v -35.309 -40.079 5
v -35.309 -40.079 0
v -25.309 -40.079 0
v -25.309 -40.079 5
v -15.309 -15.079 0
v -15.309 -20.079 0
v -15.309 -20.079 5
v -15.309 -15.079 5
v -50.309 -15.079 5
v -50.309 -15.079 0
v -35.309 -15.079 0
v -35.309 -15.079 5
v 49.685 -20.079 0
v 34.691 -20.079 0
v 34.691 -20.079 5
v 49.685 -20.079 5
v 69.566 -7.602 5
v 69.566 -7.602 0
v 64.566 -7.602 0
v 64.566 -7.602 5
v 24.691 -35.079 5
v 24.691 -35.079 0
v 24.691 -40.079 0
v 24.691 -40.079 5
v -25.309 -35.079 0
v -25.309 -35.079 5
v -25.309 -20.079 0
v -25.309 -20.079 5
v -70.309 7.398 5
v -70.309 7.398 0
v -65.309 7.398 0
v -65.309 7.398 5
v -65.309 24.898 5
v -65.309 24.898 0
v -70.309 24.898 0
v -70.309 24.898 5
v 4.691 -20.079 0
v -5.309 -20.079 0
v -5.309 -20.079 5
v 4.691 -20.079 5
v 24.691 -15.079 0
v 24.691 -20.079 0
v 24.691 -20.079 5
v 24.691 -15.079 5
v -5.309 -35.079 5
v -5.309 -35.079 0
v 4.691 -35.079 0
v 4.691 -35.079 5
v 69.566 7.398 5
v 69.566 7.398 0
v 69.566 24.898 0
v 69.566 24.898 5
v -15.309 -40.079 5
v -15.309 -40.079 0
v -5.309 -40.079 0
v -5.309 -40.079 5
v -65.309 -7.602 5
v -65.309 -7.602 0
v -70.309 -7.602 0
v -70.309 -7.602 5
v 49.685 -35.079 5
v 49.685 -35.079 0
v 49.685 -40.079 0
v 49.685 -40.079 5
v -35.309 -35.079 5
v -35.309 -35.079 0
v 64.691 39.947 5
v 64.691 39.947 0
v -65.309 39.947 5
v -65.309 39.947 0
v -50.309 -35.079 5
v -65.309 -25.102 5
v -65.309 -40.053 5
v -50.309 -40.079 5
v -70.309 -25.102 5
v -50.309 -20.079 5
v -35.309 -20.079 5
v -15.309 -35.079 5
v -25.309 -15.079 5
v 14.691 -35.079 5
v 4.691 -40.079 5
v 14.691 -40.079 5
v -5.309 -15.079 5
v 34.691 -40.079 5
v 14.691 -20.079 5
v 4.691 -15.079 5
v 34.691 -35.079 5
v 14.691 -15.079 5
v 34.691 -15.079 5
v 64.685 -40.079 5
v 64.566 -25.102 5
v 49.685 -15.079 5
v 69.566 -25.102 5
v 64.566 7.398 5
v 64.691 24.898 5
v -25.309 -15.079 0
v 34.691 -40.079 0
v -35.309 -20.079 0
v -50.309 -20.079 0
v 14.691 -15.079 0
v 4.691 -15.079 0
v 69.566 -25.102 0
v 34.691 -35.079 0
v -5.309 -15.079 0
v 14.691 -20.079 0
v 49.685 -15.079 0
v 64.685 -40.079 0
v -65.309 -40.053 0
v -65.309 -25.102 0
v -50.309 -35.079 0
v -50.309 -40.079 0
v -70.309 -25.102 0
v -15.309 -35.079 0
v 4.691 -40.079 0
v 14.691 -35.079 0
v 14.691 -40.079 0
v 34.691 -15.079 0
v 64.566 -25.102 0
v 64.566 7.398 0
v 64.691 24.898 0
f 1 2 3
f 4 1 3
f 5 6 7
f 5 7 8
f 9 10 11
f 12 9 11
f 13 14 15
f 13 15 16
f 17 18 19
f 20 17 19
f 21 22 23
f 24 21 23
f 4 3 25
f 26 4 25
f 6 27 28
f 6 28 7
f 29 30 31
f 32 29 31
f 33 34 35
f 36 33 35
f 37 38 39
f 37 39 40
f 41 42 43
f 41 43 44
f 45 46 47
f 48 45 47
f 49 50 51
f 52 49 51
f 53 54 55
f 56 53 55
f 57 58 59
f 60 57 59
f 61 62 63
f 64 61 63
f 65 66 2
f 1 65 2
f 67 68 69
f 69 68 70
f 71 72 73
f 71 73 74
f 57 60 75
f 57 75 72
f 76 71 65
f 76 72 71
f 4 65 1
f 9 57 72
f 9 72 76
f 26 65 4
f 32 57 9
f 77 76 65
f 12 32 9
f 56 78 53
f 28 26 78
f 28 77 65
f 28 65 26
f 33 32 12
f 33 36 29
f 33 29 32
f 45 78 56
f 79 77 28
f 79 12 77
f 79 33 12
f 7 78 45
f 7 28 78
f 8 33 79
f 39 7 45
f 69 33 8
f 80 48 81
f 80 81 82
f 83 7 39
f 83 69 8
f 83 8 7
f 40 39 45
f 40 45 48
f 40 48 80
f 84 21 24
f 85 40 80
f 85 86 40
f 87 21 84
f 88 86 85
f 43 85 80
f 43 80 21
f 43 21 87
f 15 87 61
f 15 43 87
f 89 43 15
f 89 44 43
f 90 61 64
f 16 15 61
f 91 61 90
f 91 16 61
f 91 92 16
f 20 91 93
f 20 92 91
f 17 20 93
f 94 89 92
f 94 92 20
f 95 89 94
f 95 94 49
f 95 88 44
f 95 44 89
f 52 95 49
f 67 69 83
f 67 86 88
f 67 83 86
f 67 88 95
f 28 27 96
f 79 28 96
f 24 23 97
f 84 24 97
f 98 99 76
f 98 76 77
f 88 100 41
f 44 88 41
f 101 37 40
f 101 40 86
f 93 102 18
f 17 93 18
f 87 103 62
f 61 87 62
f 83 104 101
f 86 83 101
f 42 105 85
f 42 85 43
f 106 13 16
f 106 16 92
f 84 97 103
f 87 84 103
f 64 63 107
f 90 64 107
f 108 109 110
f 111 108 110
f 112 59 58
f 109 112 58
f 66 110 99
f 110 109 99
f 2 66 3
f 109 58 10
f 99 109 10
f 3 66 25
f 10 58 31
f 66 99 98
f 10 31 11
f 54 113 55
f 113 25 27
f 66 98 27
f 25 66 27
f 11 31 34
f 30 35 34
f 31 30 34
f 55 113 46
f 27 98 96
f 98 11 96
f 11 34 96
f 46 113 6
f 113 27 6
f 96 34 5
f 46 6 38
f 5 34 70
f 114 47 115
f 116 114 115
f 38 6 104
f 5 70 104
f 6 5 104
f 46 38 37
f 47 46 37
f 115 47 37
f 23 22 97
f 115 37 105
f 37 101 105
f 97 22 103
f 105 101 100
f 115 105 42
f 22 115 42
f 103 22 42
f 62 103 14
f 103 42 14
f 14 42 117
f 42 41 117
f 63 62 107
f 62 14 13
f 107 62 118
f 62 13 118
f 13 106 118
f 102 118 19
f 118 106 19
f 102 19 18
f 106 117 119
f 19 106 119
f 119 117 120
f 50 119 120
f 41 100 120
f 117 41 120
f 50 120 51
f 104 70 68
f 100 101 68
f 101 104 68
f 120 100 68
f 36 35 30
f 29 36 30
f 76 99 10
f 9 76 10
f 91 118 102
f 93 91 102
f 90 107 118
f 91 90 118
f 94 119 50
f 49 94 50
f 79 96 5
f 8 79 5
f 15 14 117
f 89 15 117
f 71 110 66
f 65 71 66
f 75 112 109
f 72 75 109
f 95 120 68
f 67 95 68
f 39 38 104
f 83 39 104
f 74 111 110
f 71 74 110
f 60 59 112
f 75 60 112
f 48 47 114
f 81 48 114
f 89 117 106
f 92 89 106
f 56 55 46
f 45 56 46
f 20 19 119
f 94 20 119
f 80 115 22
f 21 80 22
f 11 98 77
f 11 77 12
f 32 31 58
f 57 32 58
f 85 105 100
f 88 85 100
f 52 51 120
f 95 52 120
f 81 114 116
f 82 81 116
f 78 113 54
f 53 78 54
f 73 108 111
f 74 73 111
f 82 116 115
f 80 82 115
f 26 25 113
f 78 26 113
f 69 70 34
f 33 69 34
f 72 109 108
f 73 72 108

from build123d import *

# Parameters (mm, degrees)
SKETCH1_W           = 10
SKETCH1_H           = 5
SKETCH1_W_2         = 15
SKETCH1_W_3         = 14.993943351
BOSS_EXTRUDE2_DEPTH = 5


with BuildPart() as part:
    # Sketch1 → Boss-Extrude2 (new body)
    with BuildSketch(Plane.XY):
        Polygon((64.690886285, 24.89766958), (64.690886285, 39.946939566), (-65.309113715, 39.946939566), (-65.309113715, 24.89766958), (-70.309113715, 24.89766958), (-70.309113715, 7.39766958), (-65.309113715, 7.39766958), (-65.309113715, -7.60233042), (-70.309113715, -7.60233042), (-70.309113715, -25.10233042), (-65.309113715, -25.10233042), (-65.309113715, -40.053060434), (-50.309113715, -40.079299927), (-50.309113715, -35.079299927), (-35.309113715, -35.079299927), (-35.309113715, -40.079299927), (-25.309113715, -40.079299927), (-25.309113715, -35.079299927), (-15.309113715, -35.079299927), (-15.309113715, -40.079299927), (-5.309113715, -40.079299927), (-5.309113715, -35.079299927), (4.690886285, -35.079299927), (4.690886285, -40.079299927), (14.690886285, -40.079299927), (14.690886285, -35.079299927), (24.690886285, -35.079299927), (24.690886285, -40.079299927), (34.690886285, -40.079299927), (34.690886285, -35.079299927), (49.684829636, -35.079299927), (49.684829636, -40.079299927), (64.684829636, -40.079299927), (64.565827504, -25.10233042), (69.565827504, -25.10233042), (69.565827504, -7.60233042), (64.565827504, -7.60233042), (64.565827504, 7.39766958), (69.565827504, 7.39766958), (69.565827504, 24.89766958), align=None)
        with Locations((-0.309113715, -17.579299927)):
            Rectangle(SKETCH1_W, SKETCH1_H, mode=Mode.SUBTRACT)
        with Locations((-20.309113715, -17.579299927)):
            Rectangle(SKETCH1_W, SKETCH1_H, mode=Mode.SUBTRACT)
        with Locations((-42.809113715, -17.579299927)):
            Rectangle(SKETCH1_W_2, SKETCH1_H, mode=Mode.SUBTRACT)
        with Locations((42.187857961, -17.579299927)):
            Rectangle(SKETCH1_W_3, SKETCH1_H, mode=Mode.SUBTRACT)
        with Locations((19.690886285, -17.579299927)):
            Rectangle(SKETCH1_W, SKETCH1_H, mode=Mode.SUBTRACT)
    extrude(amount=BOSS_EXTRUDE2_DEPTH)


solid = part.part
